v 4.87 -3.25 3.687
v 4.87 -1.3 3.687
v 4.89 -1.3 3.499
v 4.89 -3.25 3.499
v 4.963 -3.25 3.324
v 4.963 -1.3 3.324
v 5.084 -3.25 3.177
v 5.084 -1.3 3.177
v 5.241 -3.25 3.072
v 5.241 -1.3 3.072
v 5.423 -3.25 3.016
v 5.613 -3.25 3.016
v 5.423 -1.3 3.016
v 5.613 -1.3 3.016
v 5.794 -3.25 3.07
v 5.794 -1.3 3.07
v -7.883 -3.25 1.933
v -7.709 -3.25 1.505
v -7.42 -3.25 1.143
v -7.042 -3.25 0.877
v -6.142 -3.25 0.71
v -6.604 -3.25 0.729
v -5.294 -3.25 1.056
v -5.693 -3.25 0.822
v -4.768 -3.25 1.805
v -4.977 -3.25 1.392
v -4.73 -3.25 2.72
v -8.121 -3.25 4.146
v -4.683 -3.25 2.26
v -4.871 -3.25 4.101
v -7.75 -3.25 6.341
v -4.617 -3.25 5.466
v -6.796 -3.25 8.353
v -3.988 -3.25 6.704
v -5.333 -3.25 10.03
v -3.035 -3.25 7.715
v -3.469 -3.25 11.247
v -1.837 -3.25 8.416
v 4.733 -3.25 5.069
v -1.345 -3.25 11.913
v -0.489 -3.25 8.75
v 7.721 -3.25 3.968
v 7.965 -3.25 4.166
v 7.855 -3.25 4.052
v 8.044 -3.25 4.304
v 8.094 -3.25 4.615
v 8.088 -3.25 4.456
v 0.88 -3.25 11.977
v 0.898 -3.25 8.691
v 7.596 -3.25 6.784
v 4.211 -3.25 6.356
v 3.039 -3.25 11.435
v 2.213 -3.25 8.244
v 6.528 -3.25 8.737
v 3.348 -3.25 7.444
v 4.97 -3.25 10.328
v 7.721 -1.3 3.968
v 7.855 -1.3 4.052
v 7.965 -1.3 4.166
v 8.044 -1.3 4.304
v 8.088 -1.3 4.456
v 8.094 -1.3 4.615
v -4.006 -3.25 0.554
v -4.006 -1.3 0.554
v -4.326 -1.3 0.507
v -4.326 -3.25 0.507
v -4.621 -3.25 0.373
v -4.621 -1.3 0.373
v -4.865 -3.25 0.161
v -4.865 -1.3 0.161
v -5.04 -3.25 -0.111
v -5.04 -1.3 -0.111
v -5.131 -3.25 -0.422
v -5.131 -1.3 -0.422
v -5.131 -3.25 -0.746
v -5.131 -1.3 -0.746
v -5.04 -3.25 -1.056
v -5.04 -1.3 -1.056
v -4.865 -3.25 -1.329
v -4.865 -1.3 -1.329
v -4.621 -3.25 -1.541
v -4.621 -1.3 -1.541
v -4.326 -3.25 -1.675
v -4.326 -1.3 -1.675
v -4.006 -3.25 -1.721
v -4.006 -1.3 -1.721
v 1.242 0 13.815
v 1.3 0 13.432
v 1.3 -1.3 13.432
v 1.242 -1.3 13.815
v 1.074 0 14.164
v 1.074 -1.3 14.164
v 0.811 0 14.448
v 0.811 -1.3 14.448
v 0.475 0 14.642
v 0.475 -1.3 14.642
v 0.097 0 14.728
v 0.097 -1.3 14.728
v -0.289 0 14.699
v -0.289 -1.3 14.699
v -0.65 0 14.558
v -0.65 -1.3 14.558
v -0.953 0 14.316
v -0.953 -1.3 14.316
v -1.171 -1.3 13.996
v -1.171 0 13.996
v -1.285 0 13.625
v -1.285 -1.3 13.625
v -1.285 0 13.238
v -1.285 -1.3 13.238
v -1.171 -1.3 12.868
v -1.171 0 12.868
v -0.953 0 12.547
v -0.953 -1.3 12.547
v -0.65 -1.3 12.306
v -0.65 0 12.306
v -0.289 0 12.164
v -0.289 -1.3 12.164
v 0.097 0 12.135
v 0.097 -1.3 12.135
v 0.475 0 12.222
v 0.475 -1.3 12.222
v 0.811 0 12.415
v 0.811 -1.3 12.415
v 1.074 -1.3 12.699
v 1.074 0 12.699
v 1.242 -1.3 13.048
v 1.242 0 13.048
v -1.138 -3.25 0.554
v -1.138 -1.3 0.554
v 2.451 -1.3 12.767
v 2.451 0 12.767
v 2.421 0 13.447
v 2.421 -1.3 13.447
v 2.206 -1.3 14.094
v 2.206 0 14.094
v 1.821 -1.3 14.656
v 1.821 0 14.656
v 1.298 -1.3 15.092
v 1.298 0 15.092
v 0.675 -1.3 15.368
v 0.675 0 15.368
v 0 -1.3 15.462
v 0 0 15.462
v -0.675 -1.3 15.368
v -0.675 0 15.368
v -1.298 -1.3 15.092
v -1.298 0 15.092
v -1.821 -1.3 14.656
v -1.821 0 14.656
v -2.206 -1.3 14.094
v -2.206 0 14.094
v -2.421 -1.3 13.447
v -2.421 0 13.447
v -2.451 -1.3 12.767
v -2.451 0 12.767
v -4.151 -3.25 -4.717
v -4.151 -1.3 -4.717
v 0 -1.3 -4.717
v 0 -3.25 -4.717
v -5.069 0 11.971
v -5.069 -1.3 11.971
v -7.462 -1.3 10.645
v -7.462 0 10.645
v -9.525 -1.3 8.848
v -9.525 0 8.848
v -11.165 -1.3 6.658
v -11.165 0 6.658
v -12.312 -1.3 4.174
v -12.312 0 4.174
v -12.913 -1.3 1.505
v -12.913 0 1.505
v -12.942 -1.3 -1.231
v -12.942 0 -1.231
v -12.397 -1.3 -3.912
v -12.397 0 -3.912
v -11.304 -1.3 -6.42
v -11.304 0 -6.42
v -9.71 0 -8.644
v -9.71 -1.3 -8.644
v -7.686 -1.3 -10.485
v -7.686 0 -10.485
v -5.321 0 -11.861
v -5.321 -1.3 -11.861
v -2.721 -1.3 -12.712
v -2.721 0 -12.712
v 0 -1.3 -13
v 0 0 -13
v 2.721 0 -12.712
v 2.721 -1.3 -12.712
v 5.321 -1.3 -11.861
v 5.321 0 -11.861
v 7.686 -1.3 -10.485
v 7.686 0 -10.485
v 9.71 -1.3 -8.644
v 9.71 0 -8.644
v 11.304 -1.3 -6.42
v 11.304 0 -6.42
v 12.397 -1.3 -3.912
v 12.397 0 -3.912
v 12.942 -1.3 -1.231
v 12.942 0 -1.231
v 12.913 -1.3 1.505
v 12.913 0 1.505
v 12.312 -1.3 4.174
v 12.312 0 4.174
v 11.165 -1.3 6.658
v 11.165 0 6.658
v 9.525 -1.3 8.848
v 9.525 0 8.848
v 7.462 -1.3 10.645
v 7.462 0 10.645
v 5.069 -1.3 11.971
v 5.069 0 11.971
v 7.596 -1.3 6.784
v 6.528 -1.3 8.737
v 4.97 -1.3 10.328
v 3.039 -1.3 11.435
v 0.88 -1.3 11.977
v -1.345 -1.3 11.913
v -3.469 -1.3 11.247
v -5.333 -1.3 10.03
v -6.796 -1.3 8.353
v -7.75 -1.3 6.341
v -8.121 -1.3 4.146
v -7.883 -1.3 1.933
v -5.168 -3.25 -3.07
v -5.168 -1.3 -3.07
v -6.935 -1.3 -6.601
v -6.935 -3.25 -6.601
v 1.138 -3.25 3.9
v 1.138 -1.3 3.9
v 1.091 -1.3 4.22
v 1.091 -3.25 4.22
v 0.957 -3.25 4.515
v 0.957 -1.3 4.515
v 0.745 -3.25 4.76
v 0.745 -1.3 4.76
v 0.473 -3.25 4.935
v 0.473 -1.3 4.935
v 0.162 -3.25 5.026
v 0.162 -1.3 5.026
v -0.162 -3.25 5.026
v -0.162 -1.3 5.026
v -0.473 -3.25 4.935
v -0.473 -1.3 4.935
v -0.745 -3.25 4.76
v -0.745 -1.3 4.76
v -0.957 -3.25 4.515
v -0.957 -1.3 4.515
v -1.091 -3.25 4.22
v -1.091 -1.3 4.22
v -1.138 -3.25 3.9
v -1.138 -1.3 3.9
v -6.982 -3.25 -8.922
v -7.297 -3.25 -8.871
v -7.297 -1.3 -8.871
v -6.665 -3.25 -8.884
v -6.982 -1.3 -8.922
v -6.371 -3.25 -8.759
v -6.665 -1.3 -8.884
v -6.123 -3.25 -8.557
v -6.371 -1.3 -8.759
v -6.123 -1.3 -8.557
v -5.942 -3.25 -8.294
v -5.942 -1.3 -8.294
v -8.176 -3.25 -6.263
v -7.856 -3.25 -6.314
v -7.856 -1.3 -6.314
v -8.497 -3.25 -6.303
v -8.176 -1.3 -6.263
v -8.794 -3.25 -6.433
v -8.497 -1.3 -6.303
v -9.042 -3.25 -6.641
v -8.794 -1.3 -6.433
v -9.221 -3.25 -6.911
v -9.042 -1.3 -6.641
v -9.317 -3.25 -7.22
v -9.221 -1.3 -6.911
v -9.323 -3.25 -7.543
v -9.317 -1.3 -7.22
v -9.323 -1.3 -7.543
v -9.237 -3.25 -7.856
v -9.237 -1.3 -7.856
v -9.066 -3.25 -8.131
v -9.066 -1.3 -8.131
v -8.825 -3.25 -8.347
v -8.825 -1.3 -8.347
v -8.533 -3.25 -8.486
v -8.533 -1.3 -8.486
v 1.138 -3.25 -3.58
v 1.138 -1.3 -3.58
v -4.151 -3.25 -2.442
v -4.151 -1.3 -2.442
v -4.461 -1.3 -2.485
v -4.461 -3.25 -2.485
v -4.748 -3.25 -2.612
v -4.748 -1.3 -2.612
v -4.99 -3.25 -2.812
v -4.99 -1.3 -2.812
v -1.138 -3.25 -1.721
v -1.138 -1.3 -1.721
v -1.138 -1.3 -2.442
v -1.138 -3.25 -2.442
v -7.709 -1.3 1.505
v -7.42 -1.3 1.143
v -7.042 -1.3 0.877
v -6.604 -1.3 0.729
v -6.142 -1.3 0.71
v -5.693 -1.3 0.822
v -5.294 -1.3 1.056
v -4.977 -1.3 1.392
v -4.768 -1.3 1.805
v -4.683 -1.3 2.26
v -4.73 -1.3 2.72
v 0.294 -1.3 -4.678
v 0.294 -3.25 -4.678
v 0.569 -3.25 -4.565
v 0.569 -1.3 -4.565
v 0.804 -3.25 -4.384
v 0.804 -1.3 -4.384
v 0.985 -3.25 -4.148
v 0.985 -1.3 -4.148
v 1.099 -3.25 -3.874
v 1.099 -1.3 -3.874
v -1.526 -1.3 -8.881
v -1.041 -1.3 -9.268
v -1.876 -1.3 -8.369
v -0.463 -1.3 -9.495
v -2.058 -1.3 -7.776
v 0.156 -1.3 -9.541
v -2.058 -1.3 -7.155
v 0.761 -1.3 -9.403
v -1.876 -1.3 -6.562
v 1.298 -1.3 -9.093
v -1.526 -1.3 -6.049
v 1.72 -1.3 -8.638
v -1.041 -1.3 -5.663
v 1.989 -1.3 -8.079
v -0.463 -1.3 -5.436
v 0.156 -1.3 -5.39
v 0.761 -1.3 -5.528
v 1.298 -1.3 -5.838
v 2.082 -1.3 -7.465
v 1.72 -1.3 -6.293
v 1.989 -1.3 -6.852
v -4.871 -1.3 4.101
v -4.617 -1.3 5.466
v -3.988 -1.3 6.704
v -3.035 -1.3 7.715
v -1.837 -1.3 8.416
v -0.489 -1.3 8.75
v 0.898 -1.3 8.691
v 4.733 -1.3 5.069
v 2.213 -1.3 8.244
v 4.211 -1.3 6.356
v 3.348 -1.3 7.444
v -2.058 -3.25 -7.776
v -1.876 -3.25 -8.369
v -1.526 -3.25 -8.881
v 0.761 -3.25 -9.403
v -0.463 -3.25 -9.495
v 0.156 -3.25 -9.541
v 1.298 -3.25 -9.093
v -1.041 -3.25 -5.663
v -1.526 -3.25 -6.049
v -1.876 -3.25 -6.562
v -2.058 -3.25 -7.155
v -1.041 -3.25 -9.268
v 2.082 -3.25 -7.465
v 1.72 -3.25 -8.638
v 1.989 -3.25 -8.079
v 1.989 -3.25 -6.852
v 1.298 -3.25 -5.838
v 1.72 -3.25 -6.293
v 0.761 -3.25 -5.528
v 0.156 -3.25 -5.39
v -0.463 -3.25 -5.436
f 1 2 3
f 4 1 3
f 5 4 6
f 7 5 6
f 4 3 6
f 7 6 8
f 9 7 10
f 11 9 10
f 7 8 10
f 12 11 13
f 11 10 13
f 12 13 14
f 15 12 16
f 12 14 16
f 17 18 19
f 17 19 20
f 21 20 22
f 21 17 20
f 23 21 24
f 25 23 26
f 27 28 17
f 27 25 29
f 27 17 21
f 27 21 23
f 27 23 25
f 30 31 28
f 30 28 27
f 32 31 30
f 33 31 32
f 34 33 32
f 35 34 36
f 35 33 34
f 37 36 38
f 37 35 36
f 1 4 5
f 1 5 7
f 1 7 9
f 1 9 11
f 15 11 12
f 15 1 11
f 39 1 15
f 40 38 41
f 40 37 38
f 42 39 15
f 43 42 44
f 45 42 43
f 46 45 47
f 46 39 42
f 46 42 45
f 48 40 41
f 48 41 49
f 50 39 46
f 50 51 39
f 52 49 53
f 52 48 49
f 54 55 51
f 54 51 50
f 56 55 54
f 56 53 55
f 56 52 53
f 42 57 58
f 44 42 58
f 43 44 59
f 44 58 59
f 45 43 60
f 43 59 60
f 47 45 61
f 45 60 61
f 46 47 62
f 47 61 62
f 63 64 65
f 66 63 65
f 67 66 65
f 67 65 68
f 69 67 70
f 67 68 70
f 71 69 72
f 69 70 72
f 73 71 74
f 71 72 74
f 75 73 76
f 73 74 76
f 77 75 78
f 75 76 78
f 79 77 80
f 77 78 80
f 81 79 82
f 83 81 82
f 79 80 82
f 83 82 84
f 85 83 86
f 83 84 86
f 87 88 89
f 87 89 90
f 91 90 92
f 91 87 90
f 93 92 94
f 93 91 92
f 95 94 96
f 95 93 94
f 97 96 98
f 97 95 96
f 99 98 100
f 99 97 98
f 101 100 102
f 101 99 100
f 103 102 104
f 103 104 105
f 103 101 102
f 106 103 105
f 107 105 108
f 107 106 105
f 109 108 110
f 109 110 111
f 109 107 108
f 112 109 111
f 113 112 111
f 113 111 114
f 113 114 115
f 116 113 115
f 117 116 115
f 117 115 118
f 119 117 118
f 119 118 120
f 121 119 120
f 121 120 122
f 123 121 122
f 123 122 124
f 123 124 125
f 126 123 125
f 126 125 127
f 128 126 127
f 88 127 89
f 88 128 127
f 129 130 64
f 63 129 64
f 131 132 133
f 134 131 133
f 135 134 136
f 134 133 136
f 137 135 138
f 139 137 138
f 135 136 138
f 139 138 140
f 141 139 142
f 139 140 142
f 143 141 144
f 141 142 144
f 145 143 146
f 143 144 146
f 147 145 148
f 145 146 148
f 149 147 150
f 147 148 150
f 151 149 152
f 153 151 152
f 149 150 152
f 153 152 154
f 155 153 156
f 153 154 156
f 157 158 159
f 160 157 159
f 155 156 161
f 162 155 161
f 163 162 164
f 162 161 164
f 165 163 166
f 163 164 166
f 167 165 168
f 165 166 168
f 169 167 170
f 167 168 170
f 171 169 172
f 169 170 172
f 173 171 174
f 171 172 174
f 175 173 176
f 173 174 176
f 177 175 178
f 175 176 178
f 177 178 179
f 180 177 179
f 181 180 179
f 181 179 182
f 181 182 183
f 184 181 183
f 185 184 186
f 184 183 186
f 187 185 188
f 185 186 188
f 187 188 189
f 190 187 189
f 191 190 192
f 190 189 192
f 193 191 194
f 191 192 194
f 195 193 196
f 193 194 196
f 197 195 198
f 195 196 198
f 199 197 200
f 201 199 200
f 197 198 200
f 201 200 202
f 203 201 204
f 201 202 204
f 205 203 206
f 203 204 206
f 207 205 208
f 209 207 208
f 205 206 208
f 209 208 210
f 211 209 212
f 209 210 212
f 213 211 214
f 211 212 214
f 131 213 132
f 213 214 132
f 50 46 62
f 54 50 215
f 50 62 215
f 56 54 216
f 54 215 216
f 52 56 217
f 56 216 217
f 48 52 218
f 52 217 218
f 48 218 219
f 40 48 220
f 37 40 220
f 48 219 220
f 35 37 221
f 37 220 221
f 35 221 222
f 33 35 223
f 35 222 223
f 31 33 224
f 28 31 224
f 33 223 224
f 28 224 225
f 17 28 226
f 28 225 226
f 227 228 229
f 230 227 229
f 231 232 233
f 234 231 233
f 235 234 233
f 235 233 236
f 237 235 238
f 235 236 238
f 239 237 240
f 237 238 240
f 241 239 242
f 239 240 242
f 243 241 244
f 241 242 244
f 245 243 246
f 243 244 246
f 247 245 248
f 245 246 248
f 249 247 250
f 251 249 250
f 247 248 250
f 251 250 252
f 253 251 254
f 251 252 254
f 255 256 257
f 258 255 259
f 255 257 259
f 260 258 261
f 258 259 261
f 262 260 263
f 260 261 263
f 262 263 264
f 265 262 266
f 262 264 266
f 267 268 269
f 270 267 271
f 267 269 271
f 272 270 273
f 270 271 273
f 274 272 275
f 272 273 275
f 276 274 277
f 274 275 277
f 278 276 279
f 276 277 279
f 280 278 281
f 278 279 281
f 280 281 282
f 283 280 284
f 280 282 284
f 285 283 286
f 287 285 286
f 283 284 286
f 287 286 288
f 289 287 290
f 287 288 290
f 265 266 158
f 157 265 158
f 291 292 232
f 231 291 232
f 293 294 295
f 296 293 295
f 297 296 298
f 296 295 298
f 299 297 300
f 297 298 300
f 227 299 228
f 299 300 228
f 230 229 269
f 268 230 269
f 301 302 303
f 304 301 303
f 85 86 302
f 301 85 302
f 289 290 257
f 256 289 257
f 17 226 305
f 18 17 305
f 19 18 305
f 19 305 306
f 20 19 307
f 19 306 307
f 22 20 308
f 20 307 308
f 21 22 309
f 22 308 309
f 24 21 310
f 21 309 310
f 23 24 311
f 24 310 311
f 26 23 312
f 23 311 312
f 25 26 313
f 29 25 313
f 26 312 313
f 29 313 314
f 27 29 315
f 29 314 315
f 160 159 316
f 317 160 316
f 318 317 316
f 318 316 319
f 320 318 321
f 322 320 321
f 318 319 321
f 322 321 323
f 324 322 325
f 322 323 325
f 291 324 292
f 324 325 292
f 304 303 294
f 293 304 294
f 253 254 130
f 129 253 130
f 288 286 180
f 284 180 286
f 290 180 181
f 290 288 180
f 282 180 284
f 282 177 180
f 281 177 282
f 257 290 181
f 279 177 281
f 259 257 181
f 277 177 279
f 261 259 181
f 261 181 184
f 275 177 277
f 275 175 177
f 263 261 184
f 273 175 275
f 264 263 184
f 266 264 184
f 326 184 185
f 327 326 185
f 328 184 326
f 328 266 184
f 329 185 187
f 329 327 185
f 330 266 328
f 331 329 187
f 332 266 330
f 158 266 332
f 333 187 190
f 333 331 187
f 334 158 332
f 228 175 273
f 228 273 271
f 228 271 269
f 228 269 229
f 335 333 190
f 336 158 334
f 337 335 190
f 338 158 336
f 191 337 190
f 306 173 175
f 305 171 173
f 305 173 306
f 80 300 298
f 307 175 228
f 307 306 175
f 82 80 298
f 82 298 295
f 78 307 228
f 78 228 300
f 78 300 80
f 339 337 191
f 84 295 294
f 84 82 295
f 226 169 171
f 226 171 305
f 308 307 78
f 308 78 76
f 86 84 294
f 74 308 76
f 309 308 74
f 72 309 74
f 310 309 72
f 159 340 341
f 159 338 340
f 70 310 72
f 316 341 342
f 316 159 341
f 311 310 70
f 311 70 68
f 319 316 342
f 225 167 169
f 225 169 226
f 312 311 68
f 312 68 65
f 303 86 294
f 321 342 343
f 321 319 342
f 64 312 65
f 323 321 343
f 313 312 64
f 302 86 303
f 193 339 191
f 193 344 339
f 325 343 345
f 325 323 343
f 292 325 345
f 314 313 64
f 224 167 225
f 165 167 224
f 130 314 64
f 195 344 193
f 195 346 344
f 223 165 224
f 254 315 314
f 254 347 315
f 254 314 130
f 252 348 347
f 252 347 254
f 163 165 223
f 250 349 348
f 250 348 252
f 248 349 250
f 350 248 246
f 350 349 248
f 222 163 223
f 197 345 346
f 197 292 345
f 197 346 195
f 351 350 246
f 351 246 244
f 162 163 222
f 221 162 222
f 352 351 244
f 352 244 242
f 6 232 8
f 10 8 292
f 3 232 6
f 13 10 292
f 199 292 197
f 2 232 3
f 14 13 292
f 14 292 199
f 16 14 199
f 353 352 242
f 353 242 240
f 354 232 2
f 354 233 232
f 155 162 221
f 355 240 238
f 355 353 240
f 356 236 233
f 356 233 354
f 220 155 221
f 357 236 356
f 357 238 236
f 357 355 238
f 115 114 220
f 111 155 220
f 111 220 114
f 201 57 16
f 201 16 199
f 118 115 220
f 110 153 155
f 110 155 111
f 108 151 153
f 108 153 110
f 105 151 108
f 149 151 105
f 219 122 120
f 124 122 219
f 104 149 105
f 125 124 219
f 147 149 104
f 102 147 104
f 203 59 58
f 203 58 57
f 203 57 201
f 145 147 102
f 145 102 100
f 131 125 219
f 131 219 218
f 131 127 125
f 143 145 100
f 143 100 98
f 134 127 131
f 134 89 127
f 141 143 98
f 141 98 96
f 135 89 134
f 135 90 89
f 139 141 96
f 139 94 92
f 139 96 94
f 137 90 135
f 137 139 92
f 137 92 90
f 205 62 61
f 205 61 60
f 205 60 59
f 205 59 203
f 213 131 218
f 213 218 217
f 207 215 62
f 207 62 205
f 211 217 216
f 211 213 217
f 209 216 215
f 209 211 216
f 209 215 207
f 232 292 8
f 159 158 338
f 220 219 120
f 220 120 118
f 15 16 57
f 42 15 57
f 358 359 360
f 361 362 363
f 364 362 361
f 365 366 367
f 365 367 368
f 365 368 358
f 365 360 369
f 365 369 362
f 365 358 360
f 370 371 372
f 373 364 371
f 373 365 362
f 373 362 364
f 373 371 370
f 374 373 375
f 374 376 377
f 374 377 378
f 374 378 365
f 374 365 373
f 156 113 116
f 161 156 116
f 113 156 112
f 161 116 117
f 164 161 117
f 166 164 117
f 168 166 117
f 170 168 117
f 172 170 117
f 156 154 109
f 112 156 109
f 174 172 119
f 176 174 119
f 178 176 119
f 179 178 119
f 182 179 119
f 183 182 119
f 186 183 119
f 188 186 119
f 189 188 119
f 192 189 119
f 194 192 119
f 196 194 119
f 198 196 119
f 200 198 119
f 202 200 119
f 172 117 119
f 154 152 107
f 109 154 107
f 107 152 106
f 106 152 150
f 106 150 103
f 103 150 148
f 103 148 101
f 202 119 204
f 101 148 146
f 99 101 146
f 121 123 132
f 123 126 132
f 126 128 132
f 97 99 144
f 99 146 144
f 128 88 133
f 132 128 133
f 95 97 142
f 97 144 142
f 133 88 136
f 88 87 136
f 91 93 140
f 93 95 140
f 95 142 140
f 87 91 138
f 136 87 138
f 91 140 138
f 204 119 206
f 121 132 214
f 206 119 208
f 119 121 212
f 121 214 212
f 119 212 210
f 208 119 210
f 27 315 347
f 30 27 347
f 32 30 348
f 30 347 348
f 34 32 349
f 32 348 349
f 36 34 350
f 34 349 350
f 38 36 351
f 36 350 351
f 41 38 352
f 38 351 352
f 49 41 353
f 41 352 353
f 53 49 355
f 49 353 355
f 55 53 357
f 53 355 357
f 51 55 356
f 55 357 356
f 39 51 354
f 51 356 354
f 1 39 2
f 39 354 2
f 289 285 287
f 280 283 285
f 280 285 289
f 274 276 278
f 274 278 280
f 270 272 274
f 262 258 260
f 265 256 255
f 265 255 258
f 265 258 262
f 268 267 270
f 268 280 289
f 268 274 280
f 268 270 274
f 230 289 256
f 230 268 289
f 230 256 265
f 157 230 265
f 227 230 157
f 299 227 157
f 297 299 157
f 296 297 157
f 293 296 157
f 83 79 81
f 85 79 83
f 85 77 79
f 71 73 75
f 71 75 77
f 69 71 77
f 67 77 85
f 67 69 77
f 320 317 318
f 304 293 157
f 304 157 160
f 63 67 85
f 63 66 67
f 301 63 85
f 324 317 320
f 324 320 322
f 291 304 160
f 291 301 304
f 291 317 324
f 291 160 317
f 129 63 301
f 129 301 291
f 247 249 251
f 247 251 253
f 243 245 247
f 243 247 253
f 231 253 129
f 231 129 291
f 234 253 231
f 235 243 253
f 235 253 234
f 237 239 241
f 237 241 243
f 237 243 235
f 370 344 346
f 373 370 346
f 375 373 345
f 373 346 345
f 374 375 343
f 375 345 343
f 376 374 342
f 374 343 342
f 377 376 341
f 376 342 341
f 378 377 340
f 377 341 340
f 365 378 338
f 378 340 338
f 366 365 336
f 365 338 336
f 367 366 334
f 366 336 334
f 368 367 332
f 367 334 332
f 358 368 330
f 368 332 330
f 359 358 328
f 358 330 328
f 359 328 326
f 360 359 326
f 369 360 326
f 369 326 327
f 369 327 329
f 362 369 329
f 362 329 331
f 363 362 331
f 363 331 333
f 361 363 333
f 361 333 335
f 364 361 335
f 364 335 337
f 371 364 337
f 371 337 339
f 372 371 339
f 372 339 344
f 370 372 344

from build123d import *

# Parameters (mm, degrees)
F1_DEPTH = 5
F0_R     = 3.20253673
F0_R_2   = 2
F2_DEPTH = 2
F3_SCALE = 0.65


with BuildPart() as f1:
    # F0 (on Front) → F1 (new body)
    with BuildSketch(Plane.XZ):
        with BuildLine():
            ThreePointArc((11.8780601229, 6.1050535555), (12.3216651376, 6.5117042248), (12.4515672404, 7.0993058071))
            ThreePointArc((12.4515672404, 7.0993058071), (-2.0690604399, 18.3275702755), (-12.1281641394, 2.9738416091))
            ThreePointArc((-12.1281641394, 2.9738416091), (-9.0972996334, 1.1534404594), (-7.2768984837, 4.1843049654))
            ThreePointArc((-7.2768984837, 4.1843049654), (-0.7521606693, 13.4621883069), (7.4928698579, 5.6730423685))
            ThreePointArc((7.4928698579, 5.6730423685), (7.9363593577, 4.797971444), (8.914537434, 4.7231402306))
            Line((8.914537434, 4.7231402306), (11.8780601229, 6.1050535555))
        make_face()
    extrude(amount=F1_DEPTH)



with BuildPart() as f1b:
    # F0 (on Front) → F1, piece 2 (new body)
    with BuildSketch(Plane.XZ):
        with BuildLine():
            Line((1.75, -5.5069764979), (1.75, 6))
            ThreePointArc((1.75, 6), (0, 7.75), (-1.75, 6))
            Line((-1.75, 6), (-1.75, 0.8516268172))
            Line((-1.75, 0.8516268172), (-6.1623816362, 0.8516268172))
            ThreePointArc((-6.1623816362, 0.8516268172), (-7.9123816362, -0.8983731828), (-6.1623816362, -2.6483731828))
            Line((-6.1623816362, -2.6483731828), (-1.75, -2.6483731828))
            Line((-1.75, -2.6483731828), (-1.75, -3.7569764979))
            Line((-1.75, -3.7569764979), (-6.3856970519, -3.7569764979))
            ThreePointArc((-6.3856970519, -3.7569764979), (-7.3053342322, -4.0180952211), (-7.9505319996, -4.7235279761))
            Line((-7.9505319996, -4.7235279761), (-10.669789277, -10.1548852399))
            Line((-10.669789277, -10.1548852399), (-12.0862811892, -9.7137152259))
            ThreePointArc((-12.0862811892, -9.7137152259), (-14.2775052272, -10.8641661007), (-13.1270543524, -13.0553901387))
            Line((-13.1270543524, -13.0553901387), (-11.2260873483, -13.6474511541))
            ThreePointArc((-11.2260873483, -13.6474511541), (-10.0204395919, -13.5868674423), (-9.140865819, -12.7600622194))
            Line((-9.140865819, -12.7600622194), (-6.3856970519, -7.2569764979))
            Line((-6.3856970519, -7.2569764979), (0, -7.2569764979))
            ThreePointArc((0, -7.2569764979), (1.2374368671, -6.744413365), (1.75, -5.5069764979))
        make_face()
    extrude(amount=F1_DEPTH)


with BuildPart() as f1c:
    # F0 (on Front) → F1, piece 3 (new body)
    with BuildSketch(Plane.XZ):
        with Locations((0, -11.4851715043)):
            Circle(F0_R)
    extrude(amount=F1_DEPTH)


with BuildPart() as f1_1:
    add(f1.part)

    add(f1b.part)  # F2 merges F1b

    add(f1c.part)  # F2 merges F1c
    # F0 (on Front) → F2 (join)
    with BuildSketch(Plane.XZ):
        with BuildLine():
            ThreePointArc((3.7704463979, 19.6413781075), (0, 23.7874629637), (-3.7704463979, 19.6413781075))
            ThreePointArc((-3.7704463979, 19.6413781075), (0, -20), (3.7704463979, 19.6413781075))
        make_face()
        with Locations((0, -11.4851715043)):
            Circle(F0_R, mode=Mode.SUBTRACT)
        with BuildLine():
            ThreePointArc((-1.75, 6), (0, 7.75), (1.75, 6))
            Line((1.75, 6), (1.75, -5.5069764979))
            ThreePointArc((1.75, -5.5069764979), (1.2374368671, -6.744413365), (0, -7.2569764979))
            Line((0, -7.2569764979), (-6.3856970519, -7.2569764979))
            Line((-6.3856970519, -7.2569764979), (-9.140865819, -12.7600622194))
            ThreePointArc((-9.140865819, -12.7600622194), (-10.0204395919, -13.5868674423), (-11.2260873483, -13.6474511541))
            Line((-11.2260873483, -13.6474511541), (-13.1270543524, -13.0553901387))
            ThreePointArc((-13.1270543524, -13.0553901387), (-14.2775052272, -10.8641661007), (-12.0862811892, -9.7137152259))
            Line((-12.0862811892, -9.7137152259), (-10.669789277, -10.1548852399))
            Line((-10.669789277, -10.1548852399), (-7.9505319996, -4.7235279761))
            ThreePointArc((-7.9505319996, -4.7235279761), (-7.3053342322, -4.0180952211), (-6.3856970519, -3.7569764979))
            Line((-6.3856970519, -3.7569764979), (-1.75, -3.7569764979))
            Line((-1.75, -3.7569764979), (-1.75, -2.6483731828))
            Line((-1.75, -2.6483731828), (-6.1623816362, -2.6483731828))
            ThreePointArc((-6.1623816362, -2.6483731828), (-7.9123816362, -0.8983731828), (-6.1623816362, 0.8516268172))
            Line((-6.1623816362, 0.8516268172), (-1.75, 0.8516268172))
            Line((-1.75, 0.8516268172), (-1.75, 6))
        make_face(mode=Mode.SUBTRACT)
        with BuildLine():
            ThreePointArc((-12.1281641394, 2.9738416091), (-2.0690604399, 18.3275702755), (12.4515672404, 7.0993058071))
            ThreePointArc((12.4515672404, 7.0993058071), (12.3216651376, 6.5117042248), (11.8780601229, 6.1050535555))
            Line((11.8780601229, 6.1050535555), (8.914537434, 4.7231402306))
            ThreePointArc((8.914537434, 4.7231402306), (7.9363593577, 4.797971444), (7.4928698579, 5.6730423685))
            ThreePointArc((7.4928698579, 5.6730423685), (-0.7521606693, 13.4621883069), (-7.2768984837, 4.1843049654))
            ThreePointArc((-7.2768984837, 4.1843049654), (-9.0972996334, 1.1534404594), (-12.1281641394, 2.9738416091))
        make_face(mode=Mode.SUBTRACT)
        with Locations((0, 20.6641051918)):
            Circle(F0_R_2, mode=Mode.SUBTRACT)
    extrude(amount=F2_DEPTH)


with BuildPart() as f1_2:
    # F3: moved
    add(f1_1.part.scale(F3_SCALE).moved(Location((0, 0, 0))))


solid = f1_2.part
